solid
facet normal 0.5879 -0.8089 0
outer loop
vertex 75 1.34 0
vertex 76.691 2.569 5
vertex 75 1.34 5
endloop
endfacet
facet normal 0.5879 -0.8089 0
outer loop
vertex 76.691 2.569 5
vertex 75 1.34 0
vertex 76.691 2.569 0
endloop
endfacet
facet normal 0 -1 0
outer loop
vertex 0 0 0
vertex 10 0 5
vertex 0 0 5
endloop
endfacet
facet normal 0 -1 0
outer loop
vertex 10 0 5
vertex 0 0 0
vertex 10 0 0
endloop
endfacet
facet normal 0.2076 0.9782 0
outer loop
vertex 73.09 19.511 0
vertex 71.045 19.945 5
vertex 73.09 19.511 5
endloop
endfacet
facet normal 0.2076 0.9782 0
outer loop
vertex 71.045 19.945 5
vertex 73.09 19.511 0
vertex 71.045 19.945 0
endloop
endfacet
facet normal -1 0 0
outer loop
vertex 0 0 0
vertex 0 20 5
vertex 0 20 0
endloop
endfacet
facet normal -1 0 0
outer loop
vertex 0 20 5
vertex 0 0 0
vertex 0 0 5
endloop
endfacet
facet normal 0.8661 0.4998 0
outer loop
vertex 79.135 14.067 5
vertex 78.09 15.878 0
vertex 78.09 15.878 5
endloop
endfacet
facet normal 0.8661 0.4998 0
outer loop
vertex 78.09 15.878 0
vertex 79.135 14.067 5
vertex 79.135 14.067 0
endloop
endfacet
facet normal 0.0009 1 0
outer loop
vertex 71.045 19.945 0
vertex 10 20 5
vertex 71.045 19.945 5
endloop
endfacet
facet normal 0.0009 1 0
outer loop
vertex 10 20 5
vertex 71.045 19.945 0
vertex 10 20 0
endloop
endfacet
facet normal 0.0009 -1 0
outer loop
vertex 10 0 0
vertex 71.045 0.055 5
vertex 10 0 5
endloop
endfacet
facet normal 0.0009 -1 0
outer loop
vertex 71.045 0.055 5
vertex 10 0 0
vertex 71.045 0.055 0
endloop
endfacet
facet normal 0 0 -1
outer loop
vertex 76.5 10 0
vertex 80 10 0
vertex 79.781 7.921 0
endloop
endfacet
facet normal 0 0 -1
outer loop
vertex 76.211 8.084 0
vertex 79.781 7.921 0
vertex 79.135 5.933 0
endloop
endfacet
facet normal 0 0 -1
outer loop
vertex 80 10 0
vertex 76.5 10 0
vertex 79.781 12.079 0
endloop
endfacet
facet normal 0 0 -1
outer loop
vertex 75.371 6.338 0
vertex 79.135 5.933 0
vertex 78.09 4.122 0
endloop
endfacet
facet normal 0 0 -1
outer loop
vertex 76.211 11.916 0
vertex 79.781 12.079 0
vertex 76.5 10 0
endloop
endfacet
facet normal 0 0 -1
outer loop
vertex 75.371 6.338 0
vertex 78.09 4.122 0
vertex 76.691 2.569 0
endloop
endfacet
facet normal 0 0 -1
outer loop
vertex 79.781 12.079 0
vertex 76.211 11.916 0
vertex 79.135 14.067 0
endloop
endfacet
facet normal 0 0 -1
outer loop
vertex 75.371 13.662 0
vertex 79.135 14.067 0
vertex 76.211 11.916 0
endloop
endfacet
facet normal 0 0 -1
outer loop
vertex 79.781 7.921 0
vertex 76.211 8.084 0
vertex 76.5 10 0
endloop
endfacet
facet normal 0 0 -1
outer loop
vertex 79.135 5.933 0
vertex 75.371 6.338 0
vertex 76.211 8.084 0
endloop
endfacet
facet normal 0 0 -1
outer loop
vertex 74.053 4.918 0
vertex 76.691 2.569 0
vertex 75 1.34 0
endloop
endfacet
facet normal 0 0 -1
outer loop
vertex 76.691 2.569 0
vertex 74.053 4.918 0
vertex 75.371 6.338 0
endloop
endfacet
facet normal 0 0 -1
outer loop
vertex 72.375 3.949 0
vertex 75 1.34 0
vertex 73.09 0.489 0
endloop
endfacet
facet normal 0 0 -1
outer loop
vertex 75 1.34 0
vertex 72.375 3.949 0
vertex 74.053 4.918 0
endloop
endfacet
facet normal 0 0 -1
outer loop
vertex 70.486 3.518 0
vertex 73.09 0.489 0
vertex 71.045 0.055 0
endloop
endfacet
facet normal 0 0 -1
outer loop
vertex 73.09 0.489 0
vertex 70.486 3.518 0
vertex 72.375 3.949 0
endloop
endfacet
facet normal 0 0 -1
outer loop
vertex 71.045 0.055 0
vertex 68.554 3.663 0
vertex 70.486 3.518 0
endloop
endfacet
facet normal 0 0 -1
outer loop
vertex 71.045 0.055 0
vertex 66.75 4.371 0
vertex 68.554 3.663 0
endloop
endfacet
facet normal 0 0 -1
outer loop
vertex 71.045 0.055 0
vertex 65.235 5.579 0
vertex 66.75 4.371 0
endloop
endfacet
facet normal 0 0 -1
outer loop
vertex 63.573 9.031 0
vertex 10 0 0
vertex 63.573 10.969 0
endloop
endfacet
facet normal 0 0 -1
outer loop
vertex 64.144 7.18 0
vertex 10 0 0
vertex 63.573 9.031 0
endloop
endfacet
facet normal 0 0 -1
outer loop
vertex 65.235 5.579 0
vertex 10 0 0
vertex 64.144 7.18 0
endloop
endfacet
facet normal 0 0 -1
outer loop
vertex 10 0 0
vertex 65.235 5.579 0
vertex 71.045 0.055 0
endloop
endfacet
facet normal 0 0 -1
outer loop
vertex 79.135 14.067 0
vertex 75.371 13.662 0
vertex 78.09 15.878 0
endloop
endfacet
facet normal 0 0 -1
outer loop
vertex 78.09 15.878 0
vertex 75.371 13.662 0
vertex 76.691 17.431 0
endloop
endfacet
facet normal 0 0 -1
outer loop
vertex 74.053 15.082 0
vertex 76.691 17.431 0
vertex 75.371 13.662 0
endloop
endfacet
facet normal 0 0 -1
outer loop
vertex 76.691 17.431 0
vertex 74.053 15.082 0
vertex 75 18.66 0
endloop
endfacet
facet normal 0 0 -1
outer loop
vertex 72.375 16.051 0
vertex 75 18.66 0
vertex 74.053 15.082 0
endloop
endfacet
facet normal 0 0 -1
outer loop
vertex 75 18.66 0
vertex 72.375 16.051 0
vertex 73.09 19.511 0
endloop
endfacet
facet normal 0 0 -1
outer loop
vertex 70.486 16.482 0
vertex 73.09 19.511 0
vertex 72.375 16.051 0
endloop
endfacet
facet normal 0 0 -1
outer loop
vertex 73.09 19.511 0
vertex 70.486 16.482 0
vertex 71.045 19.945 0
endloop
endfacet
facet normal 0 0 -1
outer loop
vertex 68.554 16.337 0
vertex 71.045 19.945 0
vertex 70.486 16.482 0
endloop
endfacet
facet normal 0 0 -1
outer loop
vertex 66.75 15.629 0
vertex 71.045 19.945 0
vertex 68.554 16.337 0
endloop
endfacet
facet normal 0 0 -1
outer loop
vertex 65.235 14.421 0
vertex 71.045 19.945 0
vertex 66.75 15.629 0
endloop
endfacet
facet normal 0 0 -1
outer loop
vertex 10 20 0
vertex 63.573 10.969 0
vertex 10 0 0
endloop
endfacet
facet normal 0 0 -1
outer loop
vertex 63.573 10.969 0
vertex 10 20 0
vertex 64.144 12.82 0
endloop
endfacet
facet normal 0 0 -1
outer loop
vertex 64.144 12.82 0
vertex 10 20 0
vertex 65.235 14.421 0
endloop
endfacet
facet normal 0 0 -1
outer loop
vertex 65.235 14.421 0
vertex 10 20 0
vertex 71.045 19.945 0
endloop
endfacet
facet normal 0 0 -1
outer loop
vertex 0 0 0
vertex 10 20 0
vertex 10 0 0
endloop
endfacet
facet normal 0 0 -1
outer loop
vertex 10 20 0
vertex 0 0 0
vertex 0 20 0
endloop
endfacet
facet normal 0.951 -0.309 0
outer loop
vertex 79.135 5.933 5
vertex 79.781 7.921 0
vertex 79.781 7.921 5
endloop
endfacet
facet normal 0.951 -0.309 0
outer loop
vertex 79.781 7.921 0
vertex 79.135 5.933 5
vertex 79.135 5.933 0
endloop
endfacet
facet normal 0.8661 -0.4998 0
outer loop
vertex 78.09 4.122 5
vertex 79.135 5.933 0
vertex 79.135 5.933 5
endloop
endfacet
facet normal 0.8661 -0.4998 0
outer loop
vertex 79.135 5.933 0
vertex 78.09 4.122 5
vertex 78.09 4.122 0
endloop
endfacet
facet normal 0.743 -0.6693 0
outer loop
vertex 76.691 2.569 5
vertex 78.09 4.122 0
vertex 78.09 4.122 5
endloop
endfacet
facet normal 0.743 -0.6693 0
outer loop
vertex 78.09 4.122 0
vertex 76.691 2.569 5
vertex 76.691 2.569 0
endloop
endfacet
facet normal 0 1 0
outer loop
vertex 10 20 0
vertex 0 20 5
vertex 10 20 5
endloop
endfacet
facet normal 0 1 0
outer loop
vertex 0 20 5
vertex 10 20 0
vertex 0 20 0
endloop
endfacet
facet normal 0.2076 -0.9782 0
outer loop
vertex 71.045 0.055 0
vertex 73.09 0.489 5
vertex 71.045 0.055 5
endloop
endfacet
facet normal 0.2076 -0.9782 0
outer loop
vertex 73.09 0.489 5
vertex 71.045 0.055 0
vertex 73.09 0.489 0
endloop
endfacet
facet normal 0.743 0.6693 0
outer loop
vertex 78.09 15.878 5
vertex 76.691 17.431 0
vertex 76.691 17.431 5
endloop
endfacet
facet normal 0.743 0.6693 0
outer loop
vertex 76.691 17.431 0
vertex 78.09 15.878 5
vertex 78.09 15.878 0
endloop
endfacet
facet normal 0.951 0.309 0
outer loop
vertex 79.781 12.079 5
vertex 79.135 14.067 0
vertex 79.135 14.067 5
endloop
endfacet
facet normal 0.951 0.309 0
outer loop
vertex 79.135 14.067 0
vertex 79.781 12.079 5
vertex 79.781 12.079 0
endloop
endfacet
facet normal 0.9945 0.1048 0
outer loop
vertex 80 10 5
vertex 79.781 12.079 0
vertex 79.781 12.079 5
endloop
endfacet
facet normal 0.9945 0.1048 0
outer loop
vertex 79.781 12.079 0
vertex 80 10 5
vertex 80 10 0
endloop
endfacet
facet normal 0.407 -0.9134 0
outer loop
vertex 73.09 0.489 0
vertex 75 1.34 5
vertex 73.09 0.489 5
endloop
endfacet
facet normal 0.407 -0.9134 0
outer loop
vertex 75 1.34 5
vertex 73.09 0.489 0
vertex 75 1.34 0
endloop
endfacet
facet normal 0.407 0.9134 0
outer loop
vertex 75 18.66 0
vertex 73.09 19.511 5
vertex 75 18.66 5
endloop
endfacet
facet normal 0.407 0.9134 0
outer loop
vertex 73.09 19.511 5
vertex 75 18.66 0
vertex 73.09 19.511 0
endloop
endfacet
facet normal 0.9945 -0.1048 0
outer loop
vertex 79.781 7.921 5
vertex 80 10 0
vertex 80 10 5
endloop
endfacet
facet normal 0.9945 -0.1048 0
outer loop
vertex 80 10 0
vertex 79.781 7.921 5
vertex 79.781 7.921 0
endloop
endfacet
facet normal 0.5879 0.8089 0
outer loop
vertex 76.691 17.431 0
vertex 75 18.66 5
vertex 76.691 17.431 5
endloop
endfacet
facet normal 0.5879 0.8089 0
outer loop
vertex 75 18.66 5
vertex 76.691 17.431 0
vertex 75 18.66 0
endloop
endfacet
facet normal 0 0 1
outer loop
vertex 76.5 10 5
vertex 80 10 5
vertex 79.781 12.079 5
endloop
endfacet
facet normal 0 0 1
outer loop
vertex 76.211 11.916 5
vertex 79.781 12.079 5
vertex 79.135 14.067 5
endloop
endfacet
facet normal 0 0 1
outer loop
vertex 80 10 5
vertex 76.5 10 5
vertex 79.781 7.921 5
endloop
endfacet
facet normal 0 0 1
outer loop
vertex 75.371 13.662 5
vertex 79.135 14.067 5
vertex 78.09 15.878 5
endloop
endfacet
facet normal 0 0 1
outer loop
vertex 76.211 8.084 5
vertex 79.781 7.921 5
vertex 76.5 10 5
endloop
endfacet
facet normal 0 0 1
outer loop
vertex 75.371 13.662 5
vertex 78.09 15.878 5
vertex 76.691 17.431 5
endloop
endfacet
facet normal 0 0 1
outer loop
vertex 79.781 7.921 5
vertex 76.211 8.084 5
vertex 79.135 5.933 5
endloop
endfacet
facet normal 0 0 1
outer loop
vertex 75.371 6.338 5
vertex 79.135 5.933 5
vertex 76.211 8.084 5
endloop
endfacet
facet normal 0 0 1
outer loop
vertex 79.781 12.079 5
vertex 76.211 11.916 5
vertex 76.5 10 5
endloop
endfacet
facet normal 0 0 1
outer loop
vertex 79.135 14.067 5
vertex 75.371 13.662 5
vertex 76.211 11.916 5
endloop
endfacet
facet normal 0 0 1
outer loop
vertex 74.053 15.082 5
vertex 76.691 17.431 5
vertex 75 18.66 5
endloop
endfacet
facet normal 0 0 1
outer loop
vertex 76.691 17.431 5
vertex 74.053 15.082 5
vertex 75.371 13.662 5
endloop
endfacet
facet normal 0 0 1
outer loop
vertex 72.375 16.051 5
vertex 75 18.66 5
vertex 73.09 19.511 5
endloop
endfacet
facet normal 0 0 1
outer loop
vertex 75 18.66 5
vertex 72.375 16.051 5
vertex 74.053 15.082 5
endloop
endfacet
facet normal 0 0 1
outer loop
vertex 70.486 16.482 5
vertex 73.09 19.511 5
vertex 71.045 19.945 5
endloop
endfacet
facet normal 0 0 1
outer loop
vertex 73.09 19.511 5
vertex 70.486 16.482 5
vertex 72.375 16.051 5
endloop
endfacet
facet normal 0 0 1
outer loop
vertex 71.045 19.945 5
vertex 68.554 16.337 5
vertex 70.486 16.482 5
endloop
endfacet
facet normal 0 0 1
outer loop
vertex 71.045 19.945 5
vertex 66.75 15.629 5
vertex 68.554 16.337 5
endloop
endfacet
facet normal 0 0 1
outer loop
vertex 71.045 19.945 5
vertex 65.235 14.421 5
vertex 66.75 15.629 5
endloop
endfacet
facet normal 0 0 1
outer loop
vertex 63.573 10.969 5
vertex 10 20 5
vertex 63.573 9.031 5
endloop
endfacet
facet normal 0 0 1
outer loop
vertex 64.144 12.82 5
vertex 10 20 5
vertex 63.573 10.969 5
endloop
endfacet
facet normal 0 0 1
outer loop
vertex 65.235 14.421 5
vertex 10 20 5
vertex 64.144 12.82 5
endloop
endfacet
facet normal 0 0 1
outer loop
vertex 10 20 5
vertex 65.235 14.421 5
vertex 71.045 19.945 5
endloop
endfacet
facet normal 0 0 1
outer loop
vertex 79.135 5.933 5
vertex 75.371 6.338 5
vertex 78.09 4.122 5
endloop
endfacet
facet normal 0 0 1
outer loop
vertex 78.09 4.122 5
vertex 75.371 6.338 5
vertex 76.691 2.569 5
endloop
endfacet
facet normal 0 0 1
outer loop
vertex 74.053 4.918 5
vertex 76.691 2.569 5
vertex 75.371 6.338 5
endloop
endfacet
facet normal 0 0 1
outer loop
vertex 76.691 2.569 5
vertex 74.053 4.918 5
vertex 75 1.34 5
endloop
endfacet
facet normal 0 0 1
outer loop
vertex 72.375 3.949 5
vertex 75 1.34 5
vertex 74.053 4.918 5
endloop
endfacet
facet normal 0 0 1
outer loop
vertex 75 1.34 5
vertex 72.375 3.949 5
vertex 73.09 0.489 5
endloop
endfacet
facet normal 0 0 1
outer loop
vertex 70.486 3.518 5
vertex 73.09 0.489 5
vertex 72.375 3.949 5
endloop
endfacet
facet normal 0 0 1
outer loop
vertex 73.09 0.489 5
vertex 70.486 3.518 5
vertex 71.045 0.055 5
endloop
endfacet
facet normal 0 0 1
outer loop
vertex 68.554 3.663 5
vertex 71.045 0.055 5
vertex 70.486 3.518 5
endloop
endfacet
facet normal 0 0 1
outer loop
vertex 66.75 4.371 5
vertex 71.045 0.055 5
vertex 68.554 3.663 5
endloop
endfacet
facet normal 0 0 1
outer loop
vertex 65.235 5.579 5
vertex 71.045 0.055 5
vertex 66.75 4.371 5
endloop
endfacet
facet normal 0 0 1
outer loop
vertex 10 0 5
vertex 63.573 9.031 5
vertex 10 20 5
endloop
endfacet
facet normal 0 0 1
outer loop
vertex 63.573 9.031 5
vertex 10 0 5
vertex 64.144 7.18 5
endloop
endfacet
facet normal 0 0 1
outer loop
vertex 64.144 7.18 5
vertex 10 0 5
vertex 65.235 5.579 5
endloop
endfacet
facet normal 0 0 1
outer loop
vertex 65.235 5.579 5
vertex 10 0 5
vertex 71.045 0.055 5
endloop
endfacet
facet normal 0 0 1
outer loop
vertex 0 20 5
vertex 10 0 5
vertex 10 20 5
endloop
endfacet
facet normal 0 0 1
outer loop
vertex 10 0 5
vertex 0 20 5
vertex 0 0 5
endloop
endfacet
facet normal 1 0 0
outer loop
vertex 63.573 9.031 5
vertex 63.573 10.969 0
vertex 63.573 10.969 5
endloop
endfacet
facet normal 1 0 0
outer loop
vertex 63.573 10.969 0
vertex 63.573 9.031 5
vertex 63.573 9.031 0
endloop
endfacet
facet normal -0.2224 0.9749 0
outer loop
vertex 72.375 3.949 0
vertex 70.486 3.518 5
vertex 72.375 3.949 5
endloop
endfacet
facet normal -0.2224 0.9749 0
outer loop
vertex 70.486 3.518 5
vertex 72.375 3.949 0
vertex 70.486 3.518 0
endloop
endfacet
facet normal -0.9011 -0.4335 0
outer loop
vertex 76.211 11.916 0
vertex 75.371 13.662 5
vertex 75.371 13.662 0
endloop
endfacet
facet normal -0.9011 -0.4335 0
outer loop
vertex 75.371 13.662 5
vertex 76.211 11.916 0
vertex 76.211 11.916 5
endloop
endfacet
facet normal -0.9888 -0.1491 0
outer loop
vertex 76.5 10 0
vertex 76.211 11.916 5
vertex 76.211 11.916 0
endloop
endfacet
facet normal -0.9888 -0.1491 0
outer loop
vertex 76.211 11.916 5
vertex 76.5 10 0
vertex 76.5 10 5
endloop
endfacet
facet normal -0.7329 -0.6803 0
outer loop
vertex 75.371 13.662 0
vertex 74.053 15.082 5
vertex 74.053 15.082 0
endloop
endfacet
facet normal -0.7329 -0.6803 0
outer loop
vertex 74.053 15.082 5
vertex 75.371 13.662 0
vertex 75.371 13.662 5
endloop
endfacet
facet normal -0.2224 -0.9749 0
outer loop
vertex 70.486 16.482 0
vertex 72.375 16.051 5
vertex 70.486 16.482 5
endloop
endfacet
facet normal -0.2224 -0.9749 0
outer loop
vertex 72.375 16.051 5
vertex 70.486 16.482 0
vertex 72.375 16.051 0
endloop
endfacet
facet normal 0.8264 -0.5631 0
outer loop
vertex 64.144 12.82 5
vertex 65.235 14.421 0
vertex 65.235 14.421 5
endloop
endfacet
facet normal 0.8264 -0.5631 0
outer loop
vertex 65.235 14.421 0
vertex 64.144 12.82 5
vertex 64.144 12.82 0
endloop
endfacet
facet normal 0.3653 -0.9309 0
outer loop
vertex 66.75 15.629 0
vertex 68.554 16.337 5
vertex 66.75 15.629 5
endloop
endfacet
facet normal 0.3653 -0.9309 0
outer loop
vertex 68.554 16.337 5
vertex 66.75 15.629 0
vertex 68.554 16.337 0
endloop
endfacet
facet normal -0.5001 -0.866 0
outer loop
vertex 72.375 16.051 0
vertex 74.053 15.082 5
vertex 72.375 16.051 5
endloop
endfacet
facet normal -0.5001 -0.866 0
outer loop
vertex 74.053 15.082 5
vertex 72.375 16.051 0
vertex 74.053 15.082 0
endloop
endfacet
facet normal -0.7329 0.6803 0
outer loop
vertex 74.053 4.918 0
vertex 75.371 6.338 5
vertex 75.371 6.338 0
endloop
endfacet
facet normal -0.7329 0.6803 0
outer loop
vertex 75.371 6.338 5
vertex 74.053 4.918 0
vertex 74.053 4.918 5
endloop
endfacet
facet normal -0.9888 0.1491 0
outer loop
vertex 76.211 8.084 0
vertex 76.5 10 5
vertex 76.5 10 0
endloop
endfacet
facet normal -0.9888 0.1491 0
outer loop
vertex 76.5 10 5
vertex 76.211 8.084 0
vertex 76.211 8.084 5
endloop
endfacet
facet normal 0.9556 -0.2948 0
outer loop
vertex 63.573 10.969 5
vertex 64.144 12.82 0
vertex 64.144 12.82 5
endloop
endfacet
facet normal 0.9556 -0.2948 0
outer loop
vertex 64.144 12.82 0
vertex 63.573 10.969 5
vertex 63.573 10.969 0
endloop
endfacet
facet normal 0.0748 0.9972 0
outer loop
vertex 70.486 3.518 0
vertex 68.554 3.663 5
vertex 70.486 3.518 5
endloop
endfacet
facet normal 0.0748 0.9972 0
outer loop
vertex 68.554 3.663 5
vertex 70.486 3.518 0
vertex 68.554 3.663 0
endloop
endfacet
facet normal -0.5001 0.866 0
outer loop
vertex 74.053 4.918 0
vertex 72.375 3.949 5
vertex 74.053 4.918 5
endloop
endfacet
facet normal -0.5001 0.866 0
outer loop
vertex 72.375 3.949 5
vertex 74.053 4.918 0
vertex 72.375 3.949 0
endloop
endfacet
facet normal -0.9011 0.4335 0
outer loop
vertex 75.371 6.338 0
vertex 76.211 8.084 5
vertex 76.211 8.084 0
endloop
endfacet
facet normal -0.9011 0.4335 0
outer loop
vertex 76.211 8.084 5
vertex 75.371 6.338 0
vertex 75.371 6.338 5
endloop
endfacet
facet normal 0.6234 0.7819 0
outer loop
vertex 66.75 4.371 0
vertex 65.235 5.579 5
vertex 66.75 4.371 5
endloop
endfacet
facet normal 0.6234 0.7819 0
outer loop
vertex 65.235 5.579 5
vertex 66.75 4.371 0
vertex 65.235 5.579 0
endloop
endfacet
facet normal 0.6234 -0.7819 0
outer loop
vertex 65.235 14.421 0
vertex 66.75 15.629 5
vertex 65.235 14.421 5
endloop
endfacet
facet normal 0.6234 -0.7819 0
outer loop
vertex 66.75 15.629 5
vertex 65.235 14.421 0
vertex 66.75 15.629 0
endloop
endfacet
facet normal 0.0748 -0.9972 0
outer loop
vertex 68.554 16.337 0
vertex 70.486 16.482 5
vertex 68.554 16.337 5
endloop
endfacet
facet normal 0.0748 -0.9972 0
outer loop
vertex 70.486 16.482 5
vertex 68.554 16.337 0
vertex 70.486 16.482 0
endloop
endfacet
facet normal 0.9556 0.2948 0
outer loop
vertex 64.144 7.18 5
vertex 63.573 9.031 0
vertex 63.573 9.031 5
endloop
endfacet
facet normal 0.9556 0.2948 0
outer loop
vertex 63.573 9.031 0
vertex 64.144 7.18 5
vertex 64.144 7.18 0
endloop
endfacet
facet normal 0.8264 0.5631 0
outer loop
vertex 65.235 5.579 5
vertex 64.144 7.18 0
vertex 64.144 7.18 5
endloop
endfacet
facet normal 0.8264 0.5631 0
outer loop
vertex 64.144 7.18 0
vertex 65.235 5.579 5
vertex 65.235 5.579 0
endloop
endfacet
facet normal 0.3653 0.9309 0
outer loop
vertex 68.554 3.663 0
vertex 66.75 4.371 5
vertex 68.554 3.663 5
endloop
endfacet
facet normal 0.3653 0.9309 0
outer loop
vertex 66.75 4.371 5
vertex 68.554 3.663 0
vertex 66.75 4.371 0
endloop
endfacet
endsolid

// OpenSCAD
width = 20;
thickness = 5;

difference()
{
    // #1 : thing that shows up
    hull()
    {
        cube([ 10, width, thickness]);
        translate([ 70, width/2, 0])
        cylinder( d = width, h = thickness);    
    }
    // #2: thing that doesn't show up, 
          //slices away 
    translate([ 70, width/2, 0])
    cylinder( d = width/2 + 3, h = thickness); 
}
